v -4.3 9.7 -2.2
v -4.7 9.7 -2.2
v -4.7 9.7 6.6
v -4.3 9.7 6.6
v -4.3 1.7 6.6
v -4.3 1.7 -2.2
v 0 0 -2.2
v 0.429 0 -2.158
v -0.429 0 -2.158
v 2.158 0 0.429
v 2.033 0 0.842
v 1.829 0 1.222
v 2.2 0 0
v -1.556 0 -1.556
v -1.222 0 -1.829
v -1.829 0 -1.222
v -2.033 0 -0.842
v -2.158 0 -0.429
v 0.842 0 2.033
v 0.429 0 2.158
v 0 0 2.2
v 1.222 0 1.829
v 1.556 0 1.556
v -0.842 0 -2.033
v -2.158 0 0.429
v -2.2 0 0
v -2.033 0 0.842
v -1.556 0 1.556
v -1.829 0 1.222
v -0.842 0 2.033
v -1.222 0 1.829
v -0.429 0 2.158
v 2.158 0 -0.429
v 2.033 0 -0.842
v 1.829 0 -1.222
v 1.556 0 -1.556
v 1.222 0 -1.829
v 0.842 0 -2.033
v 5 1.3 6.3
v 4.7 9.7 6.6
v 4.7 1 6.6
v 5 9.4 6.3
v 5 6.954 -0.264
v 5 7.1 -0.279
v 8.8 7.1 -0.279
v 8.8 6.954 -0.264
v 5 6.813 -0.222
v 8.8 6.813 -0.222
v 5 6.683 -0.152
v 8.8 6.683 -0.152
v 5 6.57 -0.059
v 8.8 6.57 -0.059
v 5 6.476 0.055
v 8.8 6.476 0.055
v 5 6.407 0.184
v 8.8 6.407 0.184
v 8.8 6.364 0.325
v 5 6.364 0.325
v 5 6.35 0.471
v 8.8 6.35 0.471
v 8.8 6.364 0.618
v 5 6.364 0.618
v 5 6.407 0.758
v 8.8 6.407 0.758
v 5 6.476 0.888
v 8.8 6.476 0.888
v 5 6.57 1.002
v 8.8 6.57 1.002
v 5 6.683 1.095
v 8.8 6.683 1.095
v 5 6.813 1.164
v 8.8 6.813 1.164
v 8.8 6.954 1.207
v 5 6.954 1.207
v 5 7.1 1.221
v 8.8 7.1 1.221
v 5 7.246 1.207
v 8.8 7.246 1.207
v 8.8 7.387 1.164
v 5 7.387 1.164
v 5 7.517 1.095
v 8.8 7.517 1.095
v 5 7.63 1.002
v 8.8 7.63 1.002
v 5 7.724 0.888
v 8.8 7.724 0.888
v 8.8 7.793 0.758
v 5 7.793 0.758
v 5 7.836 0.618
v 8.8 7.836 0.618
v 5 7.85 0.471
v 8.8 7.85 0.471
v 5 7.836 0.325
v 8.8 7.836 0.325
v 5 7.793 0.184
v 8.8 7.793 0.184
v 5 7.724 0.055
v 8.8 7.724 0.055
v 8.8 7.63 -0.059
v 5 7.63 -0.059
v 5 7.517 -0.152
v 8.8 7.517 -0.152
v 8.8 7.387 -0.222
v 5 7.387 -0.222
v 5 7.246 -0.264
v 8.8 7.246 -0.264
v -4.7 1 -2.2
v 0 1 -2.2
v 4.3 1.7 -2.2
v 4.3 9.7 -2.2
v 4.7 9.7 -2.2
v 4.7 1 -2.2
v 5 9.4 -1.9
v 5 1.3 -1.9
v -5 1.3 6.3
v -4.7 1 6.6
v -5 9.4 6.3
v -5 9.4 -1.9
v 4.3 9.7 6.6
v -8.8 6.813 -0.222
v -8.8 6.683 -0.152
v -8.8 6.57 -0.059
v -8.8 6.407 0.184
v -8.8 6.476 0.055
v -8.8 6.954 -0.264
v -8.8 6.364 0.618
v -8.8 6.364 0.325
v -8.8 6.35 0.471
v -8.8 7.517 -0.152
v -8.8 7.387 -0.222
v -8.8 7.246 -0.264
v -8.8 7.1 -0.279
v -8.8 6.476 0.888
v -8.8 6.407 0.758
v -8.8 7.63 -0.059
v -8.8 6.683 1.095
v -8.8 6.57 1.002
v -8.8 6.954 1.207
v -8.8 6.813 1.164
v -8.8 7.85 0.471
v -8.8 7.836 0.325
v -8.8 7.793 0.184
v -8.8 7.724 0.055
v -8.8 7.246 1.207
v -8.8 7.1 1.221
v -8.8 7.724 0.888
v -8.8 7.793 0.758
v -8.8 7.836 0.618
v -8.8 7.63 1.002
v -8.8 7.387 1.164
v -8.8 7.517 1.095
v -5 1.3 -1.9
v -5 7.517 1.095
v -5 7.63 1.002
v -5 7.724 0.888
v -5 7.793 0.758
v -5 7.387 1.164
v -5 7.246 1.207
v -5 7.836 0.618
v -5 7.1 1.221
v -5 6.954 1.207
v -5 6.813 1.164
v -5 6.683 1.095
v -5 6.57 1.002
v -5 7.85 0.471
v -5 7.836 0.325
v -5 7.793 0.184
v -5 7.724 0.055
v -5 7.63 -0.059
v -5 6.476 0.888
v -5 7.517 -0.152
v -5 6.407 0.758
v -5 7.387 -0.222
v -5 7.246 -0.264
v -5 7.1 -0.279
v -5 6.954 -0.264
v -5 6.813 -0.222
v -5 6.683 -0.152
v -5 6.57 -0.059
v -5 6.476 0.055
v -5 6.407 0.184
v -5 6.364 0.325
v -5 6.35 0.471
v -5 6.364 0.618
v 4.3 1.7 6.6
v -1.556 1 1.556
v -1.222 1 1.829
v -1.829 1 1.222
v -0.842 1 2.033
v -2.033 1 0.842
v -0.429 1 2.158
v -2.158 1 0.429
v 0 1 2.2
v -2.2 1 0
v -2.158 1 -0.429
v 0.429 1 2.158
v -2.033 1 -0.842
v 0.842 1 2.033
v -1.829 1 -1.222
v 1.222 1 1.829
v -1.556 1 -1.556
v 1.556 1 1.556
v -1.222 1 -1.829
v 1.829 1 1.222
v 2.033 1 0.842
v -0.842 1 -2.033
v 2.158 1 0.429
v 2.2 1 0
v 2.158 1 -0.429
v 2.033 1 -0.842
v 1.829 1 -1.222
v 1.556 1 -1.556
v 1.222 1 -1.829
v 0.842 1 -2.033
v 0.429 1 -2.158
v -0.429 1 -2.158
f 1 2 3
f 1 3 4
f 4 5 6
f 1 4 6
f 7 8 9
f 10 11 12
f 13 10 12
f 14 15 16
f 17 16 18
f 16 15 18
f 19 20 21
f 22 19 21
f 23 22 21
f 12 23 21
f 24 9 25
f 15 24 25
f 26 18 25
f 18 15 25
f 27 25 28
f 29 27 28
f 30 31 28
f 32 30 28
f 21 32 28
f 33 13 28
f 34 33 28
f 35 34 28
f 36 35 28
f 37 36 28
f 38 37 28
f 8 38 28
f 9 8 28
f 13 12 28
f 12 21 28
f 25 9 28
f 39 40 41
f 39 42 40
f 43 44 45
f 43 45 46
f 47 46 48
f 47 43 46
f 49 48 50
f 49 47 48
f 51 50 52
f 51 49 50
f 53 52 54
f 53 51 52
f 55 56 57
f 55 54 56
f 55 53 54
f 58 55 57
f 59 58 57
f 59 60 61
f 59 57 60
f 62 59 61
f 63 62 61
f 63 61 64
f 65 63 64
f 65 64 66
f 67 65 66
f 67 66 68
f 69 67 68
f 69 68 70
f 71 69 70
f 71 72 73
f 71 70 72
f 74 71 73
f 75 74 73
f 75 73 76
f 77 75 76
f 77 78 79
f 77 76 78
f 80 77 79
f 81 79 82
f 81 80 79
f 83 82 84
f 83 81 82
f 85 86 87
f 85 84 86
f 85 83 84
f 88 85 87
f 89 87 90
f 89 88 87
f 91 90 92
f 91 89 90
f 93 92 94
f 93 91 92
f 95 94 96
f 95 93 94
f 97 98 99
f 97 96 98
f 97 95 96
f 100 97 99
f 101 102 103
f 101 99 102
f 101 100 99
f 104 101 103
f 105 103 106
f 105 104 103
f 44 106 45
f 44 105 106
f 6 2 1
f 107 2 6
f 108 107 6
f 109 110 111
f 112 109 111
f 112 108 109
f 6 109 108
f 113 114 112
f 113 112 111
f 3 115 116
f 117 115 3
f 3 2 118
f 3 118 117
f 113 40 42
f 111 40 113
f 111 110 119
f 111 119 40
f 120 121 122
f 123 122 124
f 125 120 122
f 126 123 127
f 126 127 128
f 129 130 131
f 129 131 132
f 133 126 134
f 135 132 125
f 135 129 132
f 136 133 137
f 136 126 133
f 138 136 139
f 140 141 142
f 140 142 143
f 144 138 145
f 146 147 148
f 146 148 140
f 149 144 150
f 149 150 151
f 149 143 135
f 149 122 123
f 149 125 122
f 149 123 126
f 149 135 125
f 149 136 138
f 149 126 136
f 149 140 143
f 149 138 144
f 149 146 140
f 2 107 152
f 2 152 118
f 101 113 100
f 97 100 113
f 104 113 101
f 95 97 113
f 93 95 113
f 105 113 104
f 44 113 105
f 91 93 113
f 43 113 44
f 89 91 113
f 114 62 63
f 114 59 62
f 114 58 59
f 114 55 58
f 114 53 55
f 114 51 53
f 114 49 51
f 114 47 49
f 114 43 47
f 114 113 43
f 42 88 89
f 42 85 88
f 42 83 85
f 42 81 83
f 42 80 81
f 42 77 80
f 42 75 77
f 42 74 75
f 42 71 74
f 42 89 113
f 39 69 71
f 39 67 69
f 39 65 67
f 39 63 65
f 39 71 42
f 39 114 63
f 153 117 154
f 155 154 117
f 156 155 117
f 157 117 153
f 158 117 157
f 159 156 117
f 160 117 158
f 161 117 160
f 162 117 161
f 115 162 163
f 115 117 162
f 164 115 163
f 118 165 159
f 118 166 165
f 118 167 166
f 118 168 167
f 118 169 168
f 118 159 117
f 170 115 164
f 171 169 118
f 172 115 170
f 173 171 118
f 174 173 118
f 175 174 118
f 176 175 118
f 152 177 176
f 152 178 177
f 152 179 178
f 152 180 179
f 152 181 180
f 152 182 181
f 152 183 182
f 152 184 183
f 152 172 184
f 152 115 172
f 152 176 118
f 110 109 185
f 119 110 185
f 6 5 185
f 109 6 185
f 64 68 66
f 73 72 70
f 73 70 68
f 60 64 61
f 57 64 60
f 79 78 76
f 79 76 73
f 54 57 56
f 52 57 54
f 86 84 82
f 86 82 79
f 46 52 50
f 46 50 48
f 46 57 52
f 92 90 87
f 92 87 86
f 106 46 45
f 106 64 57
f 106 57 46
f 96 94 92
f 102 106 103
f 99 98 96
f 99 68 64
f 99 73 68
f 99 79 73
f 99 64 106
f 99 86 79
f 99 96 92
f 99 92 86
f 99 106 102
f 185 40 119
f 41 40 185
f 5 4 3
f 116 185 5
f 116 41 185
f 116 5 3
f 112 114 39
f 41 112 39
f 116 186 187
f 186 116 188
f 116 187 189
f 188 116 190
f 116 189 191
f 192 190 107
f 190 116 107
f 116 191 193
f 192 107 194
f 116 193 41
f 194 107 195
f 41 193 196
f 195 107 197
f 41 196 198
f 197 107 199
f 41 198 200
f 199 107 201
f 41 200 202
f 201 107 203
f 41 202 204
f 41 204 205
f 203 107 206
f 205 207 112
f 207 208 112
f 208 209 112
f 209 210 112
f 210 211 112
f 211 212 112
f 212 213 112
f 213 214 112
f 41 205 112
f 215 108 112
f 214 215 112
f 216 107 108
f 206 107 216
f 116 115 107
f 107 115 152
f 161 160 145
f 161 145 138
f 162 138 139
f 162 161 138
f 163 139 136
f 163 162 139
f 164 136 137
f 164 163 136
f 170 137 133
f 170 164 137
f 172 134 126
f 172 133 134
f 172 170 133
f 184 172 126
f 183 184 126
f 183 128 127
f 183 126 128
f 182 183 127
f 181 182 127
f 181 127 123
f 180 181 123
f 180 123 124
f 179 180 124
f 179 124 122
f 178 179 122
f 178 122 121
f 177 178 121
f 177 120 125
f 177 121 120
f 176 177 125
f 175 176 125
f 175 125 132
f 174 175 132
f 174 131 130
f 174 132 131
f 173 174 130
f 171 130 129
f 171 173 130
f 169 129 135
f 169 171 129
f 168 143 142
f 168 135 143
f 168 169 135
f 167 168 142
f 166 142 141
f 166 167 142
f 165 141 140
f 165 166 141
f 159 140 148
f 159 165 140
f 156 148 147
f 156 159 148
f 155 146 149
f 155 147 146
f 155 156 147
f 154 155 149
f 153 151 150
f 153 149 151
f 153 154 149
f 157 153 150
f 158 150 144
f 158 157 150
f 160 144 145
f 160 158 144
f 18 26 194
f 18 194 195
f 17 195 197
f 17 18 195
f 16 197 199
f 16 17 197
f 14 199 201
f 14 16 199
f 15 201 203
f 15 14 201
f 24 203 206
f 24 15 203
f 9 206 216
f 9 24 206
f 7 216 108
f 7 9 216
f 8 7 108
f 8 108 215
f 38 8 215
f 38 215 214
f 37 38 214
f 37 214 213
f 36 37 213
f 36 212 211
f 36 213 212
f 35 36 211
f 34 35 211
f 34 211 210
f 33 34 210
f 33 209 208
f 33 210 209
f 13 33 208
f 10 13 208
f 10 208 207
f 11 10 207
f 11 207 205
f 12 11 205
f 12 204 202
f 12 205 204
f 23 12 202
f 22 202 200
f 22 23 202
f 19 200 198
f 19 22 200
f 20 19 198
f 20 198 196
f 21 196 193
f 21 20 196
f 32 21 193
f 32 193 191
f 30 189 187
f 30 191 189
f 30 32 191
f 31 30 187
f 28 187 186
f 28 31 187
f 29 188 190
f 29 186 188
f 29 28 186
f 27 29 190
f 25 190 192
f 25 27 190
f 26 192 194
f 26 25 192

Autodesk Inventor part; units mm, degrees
ref_plane "YZ Plane" through (0, 0, 0) normal (1, 0, 0) x (0, 1, 0)
ref_plane "XZ Plane" through (0, 0, 0) normal (0, 1, 0) x (-1, 0, 0)
ref_plane "XY Plane" through (0, 0, 0) normal (0, 0, 1) x (1, 0, 0)
sketch "Sketch1" plane through (0, 0, 0) normal (0, 1, 0) x (-1, 0, 0)
  circle A0 centre (0, 0) radius 2.2
  dimension "d0" = 4.4
extrude "Extrusion1" add sketch "Sketch1" along normal blind 1
sketch "Sketch2" plane through (0, 1, 0) normal (0, 1, 0) x (1, 0, 0)
  line L0 (5, -6.6) -> (-5, -6.6)
  line L1 (-5, -6.6) -> (-5, 2.2)
  line L2 (-5, 2.2) -> (5, 2.2)
  line L3 (5, 2.2) -> (5, -6.6)
  circle A0 centre (0, 0) radius 2.2 projected
  line L4 (5, -6.6) -> (-5, 2.2) construction
  line L5 (-5, -6.6) -> (5, 2.2) construction
  point P0 (0, -2.2)
  dimension "d3" = 10
extrude "Extrusion2" add sketch "Sketch2" along normal blind 0.7 contours A0 | L0 L1 L2 L3
sketch "Sketch3" plane through (0, 1.7, 0) normal (0, 1, 0) x (1, 0, 0)
  line L0 (-5, -6.6) -> (5, -6.6) projected
  line L1 (5, 2.2) -> (-5, 2.2) projected
  line L2 (-5, -6.6) -> (-4.3, -6.6)
  line L3 (-4.3, -6.6) -> (-4.3, 2.2)
  line L4 (-4.3, 2.2) -> (-5, 2.2)
  line L5 (-5, 2.2) -> (-5, -6.6)
  line L6 (5, 2.2) -> (4.3, 2.2)
  line L7 (4.3, 2.2) -> (4.3, -6.6)
  line L8 (4.3, -6.6) -> (5, -6.6)
  line L9 (5, -6.6) -> (5, 2.2)
  point P0 (0, 0)
  dimension "d6" = 0.7
  dimension "d7" = 0.7
extrude "Extrusion3" add sketch "Sketch3" along normal blind 8 contours L5 L1 L3 L0 | L7 L1 L9 L0
chamfer "Chamfer1" distance 0.3 angle 45 8 edges at (-5, 9.7, 2.2) (-5, 5.35, -2.2) (-5, 5.35, 6.6) (5, 9.7, 2.2) (5, 5.35, -2.2) (5, 5.35, 6.6) (5, 1, 2.2) (-5, 1, 2.2)
sketch "Sketch7" plane through (-5, 1.3, 6.3) normal (-1, 0, 0) x (0, 0, 1)
  line L0 (0, 0) -> (0, 8.1) projected
  line L1 (-8.2, 0) -> (0, 0) projected
  line L2 (0, 8.1) -> (-8.2, 0)
  line L3 (-8.2, 8.1) -> (-8.2, 0) projected
  line L4 (-4.1, 4.05) -> (-8.2, 4.05)
  line L5 (-8.2, 4.05) -> (-8.2, 8.1)
  line L6 (-8.2, 8.1) -> (-4.1, 8.1)
  line L7 (-4.1, 8.1) -> (-4.1, 4.05)
  line L8 (-4.1, 4.05) -> (-8.2, 4.05)
  line L9 (-8.2, 4.05) -> (-8.2, 7.55)
  line L10 (-8.2, 7.55) -> (-4.1, 7.55)
  line L11 (-4.1, 7.55) -> (-4.1, 4.05)
  circle A0 centre (-5.8287, 5.8) radius 0.75
  point P0 (-6.3, -1.3)
  dimension "d22" = 4.1
  dimension "d23" = 3.5
  dimension "d24" = 1.5
sketch "Sketch8" plane through (-5, 1.3, 6.3) normal (-1, 0, 0) x (0, 0, 1)
  point P0 (-6.3, -1.3)
extrude "Extrusion6" add sketch "Sketch7" along normal blind 3.8 contours A0
sketch "Sketch9" plane through (5, 1.3, -1.9) normal (1, 0, 0) x (0, 0, -1)
  circle A0 centre (-2.3713, 5.8) radius 0.75 projected
  circle A1 centre (-2.3713, 5.8) radius 0.75
  point P0 (-1.9, -1.3)
extrude "Extrusion7" add sketch "Sketch9" along normal blind 3.8
properties part number "McCrea_arm-connector_Walle"
